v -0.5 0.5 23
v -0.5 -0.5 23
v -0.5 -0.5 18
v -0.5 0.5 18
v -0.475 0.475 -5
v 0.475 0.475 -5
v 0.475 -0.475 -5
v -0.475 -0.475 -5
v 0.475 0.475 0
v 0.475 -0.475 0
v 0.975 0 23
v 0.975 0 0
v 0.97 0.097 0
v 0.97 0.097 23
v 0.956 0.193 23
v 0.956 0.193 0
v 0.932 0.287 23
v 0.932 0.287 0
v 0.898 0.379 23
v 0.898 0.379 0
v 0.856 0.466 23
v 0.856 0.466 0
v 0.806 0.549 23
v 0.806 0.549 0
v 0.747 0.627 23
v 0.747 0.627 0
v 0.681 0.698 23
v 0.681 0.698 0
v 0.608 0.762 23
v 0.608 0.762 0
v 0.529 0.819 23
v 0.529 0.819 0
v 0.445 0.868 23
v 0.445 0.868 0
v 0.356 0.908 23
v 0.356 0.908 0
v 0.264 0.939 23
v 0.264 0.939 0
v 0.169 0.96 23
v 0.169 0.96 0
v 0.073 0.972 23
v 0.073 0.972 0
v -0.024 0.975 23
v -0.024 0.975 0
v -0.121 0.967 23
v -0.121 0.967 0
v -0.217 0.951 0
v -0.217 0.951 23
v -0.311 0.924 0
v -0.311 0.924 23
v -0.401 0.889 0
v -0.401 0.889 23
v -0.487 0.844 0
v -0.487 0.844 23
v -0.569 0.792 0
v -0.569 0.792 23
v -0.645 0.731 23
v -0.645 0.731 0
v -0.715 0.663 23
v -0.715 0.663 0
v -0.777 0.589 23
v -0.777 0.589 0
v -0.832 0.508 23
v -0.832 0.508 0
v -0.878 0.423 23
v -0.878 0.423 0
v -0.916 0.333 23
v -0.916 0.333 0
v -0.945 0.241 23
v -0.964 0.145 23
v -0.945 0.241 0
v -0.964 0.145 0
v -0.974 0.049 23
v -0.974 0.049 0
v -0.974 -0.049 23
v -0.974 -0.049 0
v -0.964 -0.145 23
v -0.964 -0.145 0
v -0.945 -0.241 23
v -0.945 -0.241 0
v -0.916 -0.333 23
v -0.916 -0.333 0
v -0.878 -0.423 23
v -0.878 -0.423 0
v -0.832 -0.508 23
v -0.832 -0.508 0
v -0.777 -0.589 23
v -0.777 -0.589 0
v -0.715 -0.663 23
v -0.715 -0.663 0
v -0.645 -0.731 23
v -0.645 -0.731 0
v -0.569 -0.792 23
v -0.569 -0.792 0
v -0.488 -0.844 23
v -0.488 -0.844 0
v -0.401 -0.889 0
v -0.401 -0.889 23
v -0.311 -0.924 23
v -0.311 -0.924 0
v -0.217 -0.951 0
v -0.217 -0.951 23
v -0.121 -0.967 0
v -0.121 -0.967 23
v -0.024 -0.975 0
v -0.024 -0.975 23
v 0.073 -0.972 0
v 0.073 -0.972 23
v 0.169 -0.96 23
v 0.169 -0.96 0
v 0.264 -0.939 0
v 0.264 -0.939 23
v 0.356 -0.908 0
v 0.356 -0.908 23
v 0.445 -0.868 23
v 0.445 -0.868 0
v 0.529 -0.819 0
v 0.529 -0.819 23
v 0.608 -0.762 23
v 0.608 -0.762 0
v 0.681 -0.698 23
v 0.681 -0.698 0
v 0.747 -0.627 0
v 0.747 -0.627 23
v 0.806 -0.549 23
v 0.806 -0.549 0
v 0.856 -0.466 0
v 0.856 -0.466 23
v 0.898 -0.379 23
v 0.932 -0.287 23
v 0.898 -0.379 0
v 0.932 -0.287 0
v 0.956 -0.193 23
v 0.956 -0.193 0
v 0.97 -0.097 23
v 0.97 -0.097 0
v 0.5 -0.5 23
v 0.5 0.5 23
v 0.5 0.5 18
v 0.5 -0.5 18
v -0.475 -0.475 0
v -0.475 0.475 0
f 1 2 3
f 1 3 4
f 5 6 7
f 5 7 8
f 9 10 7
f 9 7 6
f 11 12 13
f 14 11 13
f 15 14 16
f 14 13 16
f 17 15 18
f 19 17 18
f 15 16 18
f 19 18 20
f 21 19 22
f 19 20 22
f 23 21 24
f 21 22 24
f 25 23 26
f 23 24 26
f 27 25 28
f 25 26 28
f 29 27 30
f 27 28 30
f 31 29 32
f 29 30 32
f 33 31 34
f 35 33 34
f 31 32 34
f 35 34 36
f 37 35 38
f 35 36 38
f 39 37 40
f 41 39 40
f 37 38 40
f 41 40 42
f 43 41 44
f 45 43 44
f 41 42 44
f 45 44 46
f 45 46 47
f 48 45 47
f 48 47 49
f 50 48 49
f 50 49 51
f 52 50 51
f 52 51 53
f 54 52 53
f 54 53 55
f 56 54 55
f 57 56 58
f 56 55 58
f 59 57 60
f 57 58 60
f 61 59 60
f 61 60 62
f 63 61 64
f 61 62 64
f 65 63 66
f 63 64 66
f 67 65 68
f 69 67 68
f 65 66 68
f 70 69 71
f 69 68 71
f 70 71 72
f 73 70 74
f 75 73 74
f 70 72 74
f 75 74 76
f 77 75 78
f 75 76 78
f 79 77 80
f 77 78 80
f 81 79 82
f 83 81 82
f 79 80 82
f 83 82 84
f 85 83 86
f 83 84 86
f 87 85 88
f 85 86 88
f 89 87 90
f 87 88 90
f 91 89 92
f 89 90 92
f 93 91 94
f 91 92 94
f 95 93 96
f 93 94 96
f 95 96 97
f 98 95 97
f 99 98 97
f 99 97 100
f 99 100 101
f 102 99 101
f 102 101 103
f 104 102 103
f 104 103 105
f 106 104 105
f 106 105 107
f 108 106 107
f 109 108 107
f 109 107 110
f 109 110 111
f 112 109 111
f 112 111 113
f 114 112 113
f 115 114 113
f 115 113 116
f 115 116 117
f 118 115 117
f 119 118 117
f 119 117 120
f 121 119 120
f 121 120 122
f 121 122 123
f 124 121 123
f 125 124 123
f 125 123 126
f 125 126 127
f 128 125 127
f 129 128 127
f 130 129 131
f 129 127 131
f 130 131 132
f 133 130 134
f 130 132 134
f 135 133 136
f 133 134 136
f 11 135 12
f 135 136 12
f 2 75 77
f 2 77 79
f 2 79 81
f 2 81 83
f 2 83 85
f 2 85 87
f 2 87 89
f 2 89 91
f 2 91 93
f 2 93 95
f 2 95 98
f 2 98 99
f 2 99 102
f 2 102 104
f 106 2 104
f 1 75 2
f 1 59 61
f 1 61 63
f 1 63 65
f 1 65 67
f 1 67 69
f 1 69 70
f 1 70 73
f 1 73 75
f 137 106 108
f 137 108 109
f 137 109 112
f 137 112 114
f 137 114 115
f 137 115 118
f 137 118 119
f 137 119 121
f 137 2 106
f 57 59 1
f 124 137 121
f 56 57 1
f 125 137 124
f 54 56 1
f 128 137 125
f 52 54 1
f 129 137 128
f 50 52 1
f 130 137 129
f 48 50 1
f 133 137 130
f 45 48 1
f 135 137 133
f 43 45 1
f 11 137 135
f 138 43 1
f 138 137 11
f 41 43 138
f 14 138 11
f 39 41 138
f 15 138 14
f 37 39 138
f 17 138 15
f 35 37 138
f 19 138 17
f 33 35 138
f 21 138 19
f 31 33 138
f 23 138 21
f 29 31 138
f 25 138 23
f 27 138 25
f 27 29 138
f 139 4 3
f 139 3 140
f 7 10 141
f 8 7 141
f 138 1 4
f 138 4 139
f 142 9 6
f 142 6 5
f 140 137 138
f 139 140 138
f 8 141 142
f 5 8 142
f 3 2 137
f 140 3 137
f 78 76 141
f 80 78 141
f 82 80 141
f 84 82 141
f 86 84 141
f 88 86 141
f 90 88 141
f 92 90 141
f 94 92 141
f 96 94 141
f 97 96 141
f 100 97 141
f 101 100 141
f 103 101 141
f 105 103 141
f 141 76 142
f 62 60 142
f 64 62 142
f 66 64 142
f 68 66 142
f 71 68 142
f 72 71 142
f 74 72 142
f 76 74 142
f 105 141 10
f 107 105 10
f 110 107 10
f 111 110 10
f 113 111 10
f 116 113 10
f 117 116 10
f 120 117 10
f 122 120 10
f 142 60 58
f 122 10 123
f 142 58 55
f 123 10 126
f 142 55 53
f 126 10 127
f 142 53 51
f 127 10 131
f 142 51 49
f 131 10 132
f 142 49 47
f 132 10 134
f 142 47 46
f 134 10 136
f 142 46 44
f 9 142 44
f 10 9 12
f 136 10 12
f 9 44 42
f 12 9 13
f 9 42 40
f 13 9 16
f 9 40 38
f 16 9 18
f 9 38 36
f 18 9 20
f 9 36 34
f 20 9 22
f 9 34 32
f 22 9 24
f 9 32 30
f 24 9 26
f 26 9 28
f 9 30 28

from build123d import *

# Parameters (mm, degrees)
SKETCH1_R           = 0.975
BOSS_EXTRUDE1_DEPTH = 23
SKETCH2_W           = 0.95
SKETCH2_H           = 0.95
BOSS_EXTRUDE2_DEPTH = 5
SKETCH3_W           = 1
SKETCH3_H           = 1
CUT_EXTRUDE1_DEPTH  = 5


with BuildPart() as part:
    # Sketch1 → Boss-Extrude1 (new body)
    with BuildSketch(Plane.XY):
        Circle(SKETCH1_R)
    extrude(amount=BOSS_EXTRUDE1_DEPTH)

    # Sketch2 → Boss-Extrude2 (add)
    with BuildSketch(Plane(origin=(0, 0, 0), x_dir=(-1, 0, 0), z_dir=(0, 0, -1))):
        Rectangle(SKETCH2_W, SKETCH2_H)
    extrude(amount=BOSS_EXTRUDE2_DEPTH)

    # Sketch3 → Cut-Extrude1 (cut)
    with BuildSketch(Plane.XY.offset(23)):
        Rectangle(SKETCH3_W, SKETCH3_H)
    extrude(amount=-CUT_EXTRUDE1_DEPTH, mode=Mode.SUBTRACT)


solid = part.part
